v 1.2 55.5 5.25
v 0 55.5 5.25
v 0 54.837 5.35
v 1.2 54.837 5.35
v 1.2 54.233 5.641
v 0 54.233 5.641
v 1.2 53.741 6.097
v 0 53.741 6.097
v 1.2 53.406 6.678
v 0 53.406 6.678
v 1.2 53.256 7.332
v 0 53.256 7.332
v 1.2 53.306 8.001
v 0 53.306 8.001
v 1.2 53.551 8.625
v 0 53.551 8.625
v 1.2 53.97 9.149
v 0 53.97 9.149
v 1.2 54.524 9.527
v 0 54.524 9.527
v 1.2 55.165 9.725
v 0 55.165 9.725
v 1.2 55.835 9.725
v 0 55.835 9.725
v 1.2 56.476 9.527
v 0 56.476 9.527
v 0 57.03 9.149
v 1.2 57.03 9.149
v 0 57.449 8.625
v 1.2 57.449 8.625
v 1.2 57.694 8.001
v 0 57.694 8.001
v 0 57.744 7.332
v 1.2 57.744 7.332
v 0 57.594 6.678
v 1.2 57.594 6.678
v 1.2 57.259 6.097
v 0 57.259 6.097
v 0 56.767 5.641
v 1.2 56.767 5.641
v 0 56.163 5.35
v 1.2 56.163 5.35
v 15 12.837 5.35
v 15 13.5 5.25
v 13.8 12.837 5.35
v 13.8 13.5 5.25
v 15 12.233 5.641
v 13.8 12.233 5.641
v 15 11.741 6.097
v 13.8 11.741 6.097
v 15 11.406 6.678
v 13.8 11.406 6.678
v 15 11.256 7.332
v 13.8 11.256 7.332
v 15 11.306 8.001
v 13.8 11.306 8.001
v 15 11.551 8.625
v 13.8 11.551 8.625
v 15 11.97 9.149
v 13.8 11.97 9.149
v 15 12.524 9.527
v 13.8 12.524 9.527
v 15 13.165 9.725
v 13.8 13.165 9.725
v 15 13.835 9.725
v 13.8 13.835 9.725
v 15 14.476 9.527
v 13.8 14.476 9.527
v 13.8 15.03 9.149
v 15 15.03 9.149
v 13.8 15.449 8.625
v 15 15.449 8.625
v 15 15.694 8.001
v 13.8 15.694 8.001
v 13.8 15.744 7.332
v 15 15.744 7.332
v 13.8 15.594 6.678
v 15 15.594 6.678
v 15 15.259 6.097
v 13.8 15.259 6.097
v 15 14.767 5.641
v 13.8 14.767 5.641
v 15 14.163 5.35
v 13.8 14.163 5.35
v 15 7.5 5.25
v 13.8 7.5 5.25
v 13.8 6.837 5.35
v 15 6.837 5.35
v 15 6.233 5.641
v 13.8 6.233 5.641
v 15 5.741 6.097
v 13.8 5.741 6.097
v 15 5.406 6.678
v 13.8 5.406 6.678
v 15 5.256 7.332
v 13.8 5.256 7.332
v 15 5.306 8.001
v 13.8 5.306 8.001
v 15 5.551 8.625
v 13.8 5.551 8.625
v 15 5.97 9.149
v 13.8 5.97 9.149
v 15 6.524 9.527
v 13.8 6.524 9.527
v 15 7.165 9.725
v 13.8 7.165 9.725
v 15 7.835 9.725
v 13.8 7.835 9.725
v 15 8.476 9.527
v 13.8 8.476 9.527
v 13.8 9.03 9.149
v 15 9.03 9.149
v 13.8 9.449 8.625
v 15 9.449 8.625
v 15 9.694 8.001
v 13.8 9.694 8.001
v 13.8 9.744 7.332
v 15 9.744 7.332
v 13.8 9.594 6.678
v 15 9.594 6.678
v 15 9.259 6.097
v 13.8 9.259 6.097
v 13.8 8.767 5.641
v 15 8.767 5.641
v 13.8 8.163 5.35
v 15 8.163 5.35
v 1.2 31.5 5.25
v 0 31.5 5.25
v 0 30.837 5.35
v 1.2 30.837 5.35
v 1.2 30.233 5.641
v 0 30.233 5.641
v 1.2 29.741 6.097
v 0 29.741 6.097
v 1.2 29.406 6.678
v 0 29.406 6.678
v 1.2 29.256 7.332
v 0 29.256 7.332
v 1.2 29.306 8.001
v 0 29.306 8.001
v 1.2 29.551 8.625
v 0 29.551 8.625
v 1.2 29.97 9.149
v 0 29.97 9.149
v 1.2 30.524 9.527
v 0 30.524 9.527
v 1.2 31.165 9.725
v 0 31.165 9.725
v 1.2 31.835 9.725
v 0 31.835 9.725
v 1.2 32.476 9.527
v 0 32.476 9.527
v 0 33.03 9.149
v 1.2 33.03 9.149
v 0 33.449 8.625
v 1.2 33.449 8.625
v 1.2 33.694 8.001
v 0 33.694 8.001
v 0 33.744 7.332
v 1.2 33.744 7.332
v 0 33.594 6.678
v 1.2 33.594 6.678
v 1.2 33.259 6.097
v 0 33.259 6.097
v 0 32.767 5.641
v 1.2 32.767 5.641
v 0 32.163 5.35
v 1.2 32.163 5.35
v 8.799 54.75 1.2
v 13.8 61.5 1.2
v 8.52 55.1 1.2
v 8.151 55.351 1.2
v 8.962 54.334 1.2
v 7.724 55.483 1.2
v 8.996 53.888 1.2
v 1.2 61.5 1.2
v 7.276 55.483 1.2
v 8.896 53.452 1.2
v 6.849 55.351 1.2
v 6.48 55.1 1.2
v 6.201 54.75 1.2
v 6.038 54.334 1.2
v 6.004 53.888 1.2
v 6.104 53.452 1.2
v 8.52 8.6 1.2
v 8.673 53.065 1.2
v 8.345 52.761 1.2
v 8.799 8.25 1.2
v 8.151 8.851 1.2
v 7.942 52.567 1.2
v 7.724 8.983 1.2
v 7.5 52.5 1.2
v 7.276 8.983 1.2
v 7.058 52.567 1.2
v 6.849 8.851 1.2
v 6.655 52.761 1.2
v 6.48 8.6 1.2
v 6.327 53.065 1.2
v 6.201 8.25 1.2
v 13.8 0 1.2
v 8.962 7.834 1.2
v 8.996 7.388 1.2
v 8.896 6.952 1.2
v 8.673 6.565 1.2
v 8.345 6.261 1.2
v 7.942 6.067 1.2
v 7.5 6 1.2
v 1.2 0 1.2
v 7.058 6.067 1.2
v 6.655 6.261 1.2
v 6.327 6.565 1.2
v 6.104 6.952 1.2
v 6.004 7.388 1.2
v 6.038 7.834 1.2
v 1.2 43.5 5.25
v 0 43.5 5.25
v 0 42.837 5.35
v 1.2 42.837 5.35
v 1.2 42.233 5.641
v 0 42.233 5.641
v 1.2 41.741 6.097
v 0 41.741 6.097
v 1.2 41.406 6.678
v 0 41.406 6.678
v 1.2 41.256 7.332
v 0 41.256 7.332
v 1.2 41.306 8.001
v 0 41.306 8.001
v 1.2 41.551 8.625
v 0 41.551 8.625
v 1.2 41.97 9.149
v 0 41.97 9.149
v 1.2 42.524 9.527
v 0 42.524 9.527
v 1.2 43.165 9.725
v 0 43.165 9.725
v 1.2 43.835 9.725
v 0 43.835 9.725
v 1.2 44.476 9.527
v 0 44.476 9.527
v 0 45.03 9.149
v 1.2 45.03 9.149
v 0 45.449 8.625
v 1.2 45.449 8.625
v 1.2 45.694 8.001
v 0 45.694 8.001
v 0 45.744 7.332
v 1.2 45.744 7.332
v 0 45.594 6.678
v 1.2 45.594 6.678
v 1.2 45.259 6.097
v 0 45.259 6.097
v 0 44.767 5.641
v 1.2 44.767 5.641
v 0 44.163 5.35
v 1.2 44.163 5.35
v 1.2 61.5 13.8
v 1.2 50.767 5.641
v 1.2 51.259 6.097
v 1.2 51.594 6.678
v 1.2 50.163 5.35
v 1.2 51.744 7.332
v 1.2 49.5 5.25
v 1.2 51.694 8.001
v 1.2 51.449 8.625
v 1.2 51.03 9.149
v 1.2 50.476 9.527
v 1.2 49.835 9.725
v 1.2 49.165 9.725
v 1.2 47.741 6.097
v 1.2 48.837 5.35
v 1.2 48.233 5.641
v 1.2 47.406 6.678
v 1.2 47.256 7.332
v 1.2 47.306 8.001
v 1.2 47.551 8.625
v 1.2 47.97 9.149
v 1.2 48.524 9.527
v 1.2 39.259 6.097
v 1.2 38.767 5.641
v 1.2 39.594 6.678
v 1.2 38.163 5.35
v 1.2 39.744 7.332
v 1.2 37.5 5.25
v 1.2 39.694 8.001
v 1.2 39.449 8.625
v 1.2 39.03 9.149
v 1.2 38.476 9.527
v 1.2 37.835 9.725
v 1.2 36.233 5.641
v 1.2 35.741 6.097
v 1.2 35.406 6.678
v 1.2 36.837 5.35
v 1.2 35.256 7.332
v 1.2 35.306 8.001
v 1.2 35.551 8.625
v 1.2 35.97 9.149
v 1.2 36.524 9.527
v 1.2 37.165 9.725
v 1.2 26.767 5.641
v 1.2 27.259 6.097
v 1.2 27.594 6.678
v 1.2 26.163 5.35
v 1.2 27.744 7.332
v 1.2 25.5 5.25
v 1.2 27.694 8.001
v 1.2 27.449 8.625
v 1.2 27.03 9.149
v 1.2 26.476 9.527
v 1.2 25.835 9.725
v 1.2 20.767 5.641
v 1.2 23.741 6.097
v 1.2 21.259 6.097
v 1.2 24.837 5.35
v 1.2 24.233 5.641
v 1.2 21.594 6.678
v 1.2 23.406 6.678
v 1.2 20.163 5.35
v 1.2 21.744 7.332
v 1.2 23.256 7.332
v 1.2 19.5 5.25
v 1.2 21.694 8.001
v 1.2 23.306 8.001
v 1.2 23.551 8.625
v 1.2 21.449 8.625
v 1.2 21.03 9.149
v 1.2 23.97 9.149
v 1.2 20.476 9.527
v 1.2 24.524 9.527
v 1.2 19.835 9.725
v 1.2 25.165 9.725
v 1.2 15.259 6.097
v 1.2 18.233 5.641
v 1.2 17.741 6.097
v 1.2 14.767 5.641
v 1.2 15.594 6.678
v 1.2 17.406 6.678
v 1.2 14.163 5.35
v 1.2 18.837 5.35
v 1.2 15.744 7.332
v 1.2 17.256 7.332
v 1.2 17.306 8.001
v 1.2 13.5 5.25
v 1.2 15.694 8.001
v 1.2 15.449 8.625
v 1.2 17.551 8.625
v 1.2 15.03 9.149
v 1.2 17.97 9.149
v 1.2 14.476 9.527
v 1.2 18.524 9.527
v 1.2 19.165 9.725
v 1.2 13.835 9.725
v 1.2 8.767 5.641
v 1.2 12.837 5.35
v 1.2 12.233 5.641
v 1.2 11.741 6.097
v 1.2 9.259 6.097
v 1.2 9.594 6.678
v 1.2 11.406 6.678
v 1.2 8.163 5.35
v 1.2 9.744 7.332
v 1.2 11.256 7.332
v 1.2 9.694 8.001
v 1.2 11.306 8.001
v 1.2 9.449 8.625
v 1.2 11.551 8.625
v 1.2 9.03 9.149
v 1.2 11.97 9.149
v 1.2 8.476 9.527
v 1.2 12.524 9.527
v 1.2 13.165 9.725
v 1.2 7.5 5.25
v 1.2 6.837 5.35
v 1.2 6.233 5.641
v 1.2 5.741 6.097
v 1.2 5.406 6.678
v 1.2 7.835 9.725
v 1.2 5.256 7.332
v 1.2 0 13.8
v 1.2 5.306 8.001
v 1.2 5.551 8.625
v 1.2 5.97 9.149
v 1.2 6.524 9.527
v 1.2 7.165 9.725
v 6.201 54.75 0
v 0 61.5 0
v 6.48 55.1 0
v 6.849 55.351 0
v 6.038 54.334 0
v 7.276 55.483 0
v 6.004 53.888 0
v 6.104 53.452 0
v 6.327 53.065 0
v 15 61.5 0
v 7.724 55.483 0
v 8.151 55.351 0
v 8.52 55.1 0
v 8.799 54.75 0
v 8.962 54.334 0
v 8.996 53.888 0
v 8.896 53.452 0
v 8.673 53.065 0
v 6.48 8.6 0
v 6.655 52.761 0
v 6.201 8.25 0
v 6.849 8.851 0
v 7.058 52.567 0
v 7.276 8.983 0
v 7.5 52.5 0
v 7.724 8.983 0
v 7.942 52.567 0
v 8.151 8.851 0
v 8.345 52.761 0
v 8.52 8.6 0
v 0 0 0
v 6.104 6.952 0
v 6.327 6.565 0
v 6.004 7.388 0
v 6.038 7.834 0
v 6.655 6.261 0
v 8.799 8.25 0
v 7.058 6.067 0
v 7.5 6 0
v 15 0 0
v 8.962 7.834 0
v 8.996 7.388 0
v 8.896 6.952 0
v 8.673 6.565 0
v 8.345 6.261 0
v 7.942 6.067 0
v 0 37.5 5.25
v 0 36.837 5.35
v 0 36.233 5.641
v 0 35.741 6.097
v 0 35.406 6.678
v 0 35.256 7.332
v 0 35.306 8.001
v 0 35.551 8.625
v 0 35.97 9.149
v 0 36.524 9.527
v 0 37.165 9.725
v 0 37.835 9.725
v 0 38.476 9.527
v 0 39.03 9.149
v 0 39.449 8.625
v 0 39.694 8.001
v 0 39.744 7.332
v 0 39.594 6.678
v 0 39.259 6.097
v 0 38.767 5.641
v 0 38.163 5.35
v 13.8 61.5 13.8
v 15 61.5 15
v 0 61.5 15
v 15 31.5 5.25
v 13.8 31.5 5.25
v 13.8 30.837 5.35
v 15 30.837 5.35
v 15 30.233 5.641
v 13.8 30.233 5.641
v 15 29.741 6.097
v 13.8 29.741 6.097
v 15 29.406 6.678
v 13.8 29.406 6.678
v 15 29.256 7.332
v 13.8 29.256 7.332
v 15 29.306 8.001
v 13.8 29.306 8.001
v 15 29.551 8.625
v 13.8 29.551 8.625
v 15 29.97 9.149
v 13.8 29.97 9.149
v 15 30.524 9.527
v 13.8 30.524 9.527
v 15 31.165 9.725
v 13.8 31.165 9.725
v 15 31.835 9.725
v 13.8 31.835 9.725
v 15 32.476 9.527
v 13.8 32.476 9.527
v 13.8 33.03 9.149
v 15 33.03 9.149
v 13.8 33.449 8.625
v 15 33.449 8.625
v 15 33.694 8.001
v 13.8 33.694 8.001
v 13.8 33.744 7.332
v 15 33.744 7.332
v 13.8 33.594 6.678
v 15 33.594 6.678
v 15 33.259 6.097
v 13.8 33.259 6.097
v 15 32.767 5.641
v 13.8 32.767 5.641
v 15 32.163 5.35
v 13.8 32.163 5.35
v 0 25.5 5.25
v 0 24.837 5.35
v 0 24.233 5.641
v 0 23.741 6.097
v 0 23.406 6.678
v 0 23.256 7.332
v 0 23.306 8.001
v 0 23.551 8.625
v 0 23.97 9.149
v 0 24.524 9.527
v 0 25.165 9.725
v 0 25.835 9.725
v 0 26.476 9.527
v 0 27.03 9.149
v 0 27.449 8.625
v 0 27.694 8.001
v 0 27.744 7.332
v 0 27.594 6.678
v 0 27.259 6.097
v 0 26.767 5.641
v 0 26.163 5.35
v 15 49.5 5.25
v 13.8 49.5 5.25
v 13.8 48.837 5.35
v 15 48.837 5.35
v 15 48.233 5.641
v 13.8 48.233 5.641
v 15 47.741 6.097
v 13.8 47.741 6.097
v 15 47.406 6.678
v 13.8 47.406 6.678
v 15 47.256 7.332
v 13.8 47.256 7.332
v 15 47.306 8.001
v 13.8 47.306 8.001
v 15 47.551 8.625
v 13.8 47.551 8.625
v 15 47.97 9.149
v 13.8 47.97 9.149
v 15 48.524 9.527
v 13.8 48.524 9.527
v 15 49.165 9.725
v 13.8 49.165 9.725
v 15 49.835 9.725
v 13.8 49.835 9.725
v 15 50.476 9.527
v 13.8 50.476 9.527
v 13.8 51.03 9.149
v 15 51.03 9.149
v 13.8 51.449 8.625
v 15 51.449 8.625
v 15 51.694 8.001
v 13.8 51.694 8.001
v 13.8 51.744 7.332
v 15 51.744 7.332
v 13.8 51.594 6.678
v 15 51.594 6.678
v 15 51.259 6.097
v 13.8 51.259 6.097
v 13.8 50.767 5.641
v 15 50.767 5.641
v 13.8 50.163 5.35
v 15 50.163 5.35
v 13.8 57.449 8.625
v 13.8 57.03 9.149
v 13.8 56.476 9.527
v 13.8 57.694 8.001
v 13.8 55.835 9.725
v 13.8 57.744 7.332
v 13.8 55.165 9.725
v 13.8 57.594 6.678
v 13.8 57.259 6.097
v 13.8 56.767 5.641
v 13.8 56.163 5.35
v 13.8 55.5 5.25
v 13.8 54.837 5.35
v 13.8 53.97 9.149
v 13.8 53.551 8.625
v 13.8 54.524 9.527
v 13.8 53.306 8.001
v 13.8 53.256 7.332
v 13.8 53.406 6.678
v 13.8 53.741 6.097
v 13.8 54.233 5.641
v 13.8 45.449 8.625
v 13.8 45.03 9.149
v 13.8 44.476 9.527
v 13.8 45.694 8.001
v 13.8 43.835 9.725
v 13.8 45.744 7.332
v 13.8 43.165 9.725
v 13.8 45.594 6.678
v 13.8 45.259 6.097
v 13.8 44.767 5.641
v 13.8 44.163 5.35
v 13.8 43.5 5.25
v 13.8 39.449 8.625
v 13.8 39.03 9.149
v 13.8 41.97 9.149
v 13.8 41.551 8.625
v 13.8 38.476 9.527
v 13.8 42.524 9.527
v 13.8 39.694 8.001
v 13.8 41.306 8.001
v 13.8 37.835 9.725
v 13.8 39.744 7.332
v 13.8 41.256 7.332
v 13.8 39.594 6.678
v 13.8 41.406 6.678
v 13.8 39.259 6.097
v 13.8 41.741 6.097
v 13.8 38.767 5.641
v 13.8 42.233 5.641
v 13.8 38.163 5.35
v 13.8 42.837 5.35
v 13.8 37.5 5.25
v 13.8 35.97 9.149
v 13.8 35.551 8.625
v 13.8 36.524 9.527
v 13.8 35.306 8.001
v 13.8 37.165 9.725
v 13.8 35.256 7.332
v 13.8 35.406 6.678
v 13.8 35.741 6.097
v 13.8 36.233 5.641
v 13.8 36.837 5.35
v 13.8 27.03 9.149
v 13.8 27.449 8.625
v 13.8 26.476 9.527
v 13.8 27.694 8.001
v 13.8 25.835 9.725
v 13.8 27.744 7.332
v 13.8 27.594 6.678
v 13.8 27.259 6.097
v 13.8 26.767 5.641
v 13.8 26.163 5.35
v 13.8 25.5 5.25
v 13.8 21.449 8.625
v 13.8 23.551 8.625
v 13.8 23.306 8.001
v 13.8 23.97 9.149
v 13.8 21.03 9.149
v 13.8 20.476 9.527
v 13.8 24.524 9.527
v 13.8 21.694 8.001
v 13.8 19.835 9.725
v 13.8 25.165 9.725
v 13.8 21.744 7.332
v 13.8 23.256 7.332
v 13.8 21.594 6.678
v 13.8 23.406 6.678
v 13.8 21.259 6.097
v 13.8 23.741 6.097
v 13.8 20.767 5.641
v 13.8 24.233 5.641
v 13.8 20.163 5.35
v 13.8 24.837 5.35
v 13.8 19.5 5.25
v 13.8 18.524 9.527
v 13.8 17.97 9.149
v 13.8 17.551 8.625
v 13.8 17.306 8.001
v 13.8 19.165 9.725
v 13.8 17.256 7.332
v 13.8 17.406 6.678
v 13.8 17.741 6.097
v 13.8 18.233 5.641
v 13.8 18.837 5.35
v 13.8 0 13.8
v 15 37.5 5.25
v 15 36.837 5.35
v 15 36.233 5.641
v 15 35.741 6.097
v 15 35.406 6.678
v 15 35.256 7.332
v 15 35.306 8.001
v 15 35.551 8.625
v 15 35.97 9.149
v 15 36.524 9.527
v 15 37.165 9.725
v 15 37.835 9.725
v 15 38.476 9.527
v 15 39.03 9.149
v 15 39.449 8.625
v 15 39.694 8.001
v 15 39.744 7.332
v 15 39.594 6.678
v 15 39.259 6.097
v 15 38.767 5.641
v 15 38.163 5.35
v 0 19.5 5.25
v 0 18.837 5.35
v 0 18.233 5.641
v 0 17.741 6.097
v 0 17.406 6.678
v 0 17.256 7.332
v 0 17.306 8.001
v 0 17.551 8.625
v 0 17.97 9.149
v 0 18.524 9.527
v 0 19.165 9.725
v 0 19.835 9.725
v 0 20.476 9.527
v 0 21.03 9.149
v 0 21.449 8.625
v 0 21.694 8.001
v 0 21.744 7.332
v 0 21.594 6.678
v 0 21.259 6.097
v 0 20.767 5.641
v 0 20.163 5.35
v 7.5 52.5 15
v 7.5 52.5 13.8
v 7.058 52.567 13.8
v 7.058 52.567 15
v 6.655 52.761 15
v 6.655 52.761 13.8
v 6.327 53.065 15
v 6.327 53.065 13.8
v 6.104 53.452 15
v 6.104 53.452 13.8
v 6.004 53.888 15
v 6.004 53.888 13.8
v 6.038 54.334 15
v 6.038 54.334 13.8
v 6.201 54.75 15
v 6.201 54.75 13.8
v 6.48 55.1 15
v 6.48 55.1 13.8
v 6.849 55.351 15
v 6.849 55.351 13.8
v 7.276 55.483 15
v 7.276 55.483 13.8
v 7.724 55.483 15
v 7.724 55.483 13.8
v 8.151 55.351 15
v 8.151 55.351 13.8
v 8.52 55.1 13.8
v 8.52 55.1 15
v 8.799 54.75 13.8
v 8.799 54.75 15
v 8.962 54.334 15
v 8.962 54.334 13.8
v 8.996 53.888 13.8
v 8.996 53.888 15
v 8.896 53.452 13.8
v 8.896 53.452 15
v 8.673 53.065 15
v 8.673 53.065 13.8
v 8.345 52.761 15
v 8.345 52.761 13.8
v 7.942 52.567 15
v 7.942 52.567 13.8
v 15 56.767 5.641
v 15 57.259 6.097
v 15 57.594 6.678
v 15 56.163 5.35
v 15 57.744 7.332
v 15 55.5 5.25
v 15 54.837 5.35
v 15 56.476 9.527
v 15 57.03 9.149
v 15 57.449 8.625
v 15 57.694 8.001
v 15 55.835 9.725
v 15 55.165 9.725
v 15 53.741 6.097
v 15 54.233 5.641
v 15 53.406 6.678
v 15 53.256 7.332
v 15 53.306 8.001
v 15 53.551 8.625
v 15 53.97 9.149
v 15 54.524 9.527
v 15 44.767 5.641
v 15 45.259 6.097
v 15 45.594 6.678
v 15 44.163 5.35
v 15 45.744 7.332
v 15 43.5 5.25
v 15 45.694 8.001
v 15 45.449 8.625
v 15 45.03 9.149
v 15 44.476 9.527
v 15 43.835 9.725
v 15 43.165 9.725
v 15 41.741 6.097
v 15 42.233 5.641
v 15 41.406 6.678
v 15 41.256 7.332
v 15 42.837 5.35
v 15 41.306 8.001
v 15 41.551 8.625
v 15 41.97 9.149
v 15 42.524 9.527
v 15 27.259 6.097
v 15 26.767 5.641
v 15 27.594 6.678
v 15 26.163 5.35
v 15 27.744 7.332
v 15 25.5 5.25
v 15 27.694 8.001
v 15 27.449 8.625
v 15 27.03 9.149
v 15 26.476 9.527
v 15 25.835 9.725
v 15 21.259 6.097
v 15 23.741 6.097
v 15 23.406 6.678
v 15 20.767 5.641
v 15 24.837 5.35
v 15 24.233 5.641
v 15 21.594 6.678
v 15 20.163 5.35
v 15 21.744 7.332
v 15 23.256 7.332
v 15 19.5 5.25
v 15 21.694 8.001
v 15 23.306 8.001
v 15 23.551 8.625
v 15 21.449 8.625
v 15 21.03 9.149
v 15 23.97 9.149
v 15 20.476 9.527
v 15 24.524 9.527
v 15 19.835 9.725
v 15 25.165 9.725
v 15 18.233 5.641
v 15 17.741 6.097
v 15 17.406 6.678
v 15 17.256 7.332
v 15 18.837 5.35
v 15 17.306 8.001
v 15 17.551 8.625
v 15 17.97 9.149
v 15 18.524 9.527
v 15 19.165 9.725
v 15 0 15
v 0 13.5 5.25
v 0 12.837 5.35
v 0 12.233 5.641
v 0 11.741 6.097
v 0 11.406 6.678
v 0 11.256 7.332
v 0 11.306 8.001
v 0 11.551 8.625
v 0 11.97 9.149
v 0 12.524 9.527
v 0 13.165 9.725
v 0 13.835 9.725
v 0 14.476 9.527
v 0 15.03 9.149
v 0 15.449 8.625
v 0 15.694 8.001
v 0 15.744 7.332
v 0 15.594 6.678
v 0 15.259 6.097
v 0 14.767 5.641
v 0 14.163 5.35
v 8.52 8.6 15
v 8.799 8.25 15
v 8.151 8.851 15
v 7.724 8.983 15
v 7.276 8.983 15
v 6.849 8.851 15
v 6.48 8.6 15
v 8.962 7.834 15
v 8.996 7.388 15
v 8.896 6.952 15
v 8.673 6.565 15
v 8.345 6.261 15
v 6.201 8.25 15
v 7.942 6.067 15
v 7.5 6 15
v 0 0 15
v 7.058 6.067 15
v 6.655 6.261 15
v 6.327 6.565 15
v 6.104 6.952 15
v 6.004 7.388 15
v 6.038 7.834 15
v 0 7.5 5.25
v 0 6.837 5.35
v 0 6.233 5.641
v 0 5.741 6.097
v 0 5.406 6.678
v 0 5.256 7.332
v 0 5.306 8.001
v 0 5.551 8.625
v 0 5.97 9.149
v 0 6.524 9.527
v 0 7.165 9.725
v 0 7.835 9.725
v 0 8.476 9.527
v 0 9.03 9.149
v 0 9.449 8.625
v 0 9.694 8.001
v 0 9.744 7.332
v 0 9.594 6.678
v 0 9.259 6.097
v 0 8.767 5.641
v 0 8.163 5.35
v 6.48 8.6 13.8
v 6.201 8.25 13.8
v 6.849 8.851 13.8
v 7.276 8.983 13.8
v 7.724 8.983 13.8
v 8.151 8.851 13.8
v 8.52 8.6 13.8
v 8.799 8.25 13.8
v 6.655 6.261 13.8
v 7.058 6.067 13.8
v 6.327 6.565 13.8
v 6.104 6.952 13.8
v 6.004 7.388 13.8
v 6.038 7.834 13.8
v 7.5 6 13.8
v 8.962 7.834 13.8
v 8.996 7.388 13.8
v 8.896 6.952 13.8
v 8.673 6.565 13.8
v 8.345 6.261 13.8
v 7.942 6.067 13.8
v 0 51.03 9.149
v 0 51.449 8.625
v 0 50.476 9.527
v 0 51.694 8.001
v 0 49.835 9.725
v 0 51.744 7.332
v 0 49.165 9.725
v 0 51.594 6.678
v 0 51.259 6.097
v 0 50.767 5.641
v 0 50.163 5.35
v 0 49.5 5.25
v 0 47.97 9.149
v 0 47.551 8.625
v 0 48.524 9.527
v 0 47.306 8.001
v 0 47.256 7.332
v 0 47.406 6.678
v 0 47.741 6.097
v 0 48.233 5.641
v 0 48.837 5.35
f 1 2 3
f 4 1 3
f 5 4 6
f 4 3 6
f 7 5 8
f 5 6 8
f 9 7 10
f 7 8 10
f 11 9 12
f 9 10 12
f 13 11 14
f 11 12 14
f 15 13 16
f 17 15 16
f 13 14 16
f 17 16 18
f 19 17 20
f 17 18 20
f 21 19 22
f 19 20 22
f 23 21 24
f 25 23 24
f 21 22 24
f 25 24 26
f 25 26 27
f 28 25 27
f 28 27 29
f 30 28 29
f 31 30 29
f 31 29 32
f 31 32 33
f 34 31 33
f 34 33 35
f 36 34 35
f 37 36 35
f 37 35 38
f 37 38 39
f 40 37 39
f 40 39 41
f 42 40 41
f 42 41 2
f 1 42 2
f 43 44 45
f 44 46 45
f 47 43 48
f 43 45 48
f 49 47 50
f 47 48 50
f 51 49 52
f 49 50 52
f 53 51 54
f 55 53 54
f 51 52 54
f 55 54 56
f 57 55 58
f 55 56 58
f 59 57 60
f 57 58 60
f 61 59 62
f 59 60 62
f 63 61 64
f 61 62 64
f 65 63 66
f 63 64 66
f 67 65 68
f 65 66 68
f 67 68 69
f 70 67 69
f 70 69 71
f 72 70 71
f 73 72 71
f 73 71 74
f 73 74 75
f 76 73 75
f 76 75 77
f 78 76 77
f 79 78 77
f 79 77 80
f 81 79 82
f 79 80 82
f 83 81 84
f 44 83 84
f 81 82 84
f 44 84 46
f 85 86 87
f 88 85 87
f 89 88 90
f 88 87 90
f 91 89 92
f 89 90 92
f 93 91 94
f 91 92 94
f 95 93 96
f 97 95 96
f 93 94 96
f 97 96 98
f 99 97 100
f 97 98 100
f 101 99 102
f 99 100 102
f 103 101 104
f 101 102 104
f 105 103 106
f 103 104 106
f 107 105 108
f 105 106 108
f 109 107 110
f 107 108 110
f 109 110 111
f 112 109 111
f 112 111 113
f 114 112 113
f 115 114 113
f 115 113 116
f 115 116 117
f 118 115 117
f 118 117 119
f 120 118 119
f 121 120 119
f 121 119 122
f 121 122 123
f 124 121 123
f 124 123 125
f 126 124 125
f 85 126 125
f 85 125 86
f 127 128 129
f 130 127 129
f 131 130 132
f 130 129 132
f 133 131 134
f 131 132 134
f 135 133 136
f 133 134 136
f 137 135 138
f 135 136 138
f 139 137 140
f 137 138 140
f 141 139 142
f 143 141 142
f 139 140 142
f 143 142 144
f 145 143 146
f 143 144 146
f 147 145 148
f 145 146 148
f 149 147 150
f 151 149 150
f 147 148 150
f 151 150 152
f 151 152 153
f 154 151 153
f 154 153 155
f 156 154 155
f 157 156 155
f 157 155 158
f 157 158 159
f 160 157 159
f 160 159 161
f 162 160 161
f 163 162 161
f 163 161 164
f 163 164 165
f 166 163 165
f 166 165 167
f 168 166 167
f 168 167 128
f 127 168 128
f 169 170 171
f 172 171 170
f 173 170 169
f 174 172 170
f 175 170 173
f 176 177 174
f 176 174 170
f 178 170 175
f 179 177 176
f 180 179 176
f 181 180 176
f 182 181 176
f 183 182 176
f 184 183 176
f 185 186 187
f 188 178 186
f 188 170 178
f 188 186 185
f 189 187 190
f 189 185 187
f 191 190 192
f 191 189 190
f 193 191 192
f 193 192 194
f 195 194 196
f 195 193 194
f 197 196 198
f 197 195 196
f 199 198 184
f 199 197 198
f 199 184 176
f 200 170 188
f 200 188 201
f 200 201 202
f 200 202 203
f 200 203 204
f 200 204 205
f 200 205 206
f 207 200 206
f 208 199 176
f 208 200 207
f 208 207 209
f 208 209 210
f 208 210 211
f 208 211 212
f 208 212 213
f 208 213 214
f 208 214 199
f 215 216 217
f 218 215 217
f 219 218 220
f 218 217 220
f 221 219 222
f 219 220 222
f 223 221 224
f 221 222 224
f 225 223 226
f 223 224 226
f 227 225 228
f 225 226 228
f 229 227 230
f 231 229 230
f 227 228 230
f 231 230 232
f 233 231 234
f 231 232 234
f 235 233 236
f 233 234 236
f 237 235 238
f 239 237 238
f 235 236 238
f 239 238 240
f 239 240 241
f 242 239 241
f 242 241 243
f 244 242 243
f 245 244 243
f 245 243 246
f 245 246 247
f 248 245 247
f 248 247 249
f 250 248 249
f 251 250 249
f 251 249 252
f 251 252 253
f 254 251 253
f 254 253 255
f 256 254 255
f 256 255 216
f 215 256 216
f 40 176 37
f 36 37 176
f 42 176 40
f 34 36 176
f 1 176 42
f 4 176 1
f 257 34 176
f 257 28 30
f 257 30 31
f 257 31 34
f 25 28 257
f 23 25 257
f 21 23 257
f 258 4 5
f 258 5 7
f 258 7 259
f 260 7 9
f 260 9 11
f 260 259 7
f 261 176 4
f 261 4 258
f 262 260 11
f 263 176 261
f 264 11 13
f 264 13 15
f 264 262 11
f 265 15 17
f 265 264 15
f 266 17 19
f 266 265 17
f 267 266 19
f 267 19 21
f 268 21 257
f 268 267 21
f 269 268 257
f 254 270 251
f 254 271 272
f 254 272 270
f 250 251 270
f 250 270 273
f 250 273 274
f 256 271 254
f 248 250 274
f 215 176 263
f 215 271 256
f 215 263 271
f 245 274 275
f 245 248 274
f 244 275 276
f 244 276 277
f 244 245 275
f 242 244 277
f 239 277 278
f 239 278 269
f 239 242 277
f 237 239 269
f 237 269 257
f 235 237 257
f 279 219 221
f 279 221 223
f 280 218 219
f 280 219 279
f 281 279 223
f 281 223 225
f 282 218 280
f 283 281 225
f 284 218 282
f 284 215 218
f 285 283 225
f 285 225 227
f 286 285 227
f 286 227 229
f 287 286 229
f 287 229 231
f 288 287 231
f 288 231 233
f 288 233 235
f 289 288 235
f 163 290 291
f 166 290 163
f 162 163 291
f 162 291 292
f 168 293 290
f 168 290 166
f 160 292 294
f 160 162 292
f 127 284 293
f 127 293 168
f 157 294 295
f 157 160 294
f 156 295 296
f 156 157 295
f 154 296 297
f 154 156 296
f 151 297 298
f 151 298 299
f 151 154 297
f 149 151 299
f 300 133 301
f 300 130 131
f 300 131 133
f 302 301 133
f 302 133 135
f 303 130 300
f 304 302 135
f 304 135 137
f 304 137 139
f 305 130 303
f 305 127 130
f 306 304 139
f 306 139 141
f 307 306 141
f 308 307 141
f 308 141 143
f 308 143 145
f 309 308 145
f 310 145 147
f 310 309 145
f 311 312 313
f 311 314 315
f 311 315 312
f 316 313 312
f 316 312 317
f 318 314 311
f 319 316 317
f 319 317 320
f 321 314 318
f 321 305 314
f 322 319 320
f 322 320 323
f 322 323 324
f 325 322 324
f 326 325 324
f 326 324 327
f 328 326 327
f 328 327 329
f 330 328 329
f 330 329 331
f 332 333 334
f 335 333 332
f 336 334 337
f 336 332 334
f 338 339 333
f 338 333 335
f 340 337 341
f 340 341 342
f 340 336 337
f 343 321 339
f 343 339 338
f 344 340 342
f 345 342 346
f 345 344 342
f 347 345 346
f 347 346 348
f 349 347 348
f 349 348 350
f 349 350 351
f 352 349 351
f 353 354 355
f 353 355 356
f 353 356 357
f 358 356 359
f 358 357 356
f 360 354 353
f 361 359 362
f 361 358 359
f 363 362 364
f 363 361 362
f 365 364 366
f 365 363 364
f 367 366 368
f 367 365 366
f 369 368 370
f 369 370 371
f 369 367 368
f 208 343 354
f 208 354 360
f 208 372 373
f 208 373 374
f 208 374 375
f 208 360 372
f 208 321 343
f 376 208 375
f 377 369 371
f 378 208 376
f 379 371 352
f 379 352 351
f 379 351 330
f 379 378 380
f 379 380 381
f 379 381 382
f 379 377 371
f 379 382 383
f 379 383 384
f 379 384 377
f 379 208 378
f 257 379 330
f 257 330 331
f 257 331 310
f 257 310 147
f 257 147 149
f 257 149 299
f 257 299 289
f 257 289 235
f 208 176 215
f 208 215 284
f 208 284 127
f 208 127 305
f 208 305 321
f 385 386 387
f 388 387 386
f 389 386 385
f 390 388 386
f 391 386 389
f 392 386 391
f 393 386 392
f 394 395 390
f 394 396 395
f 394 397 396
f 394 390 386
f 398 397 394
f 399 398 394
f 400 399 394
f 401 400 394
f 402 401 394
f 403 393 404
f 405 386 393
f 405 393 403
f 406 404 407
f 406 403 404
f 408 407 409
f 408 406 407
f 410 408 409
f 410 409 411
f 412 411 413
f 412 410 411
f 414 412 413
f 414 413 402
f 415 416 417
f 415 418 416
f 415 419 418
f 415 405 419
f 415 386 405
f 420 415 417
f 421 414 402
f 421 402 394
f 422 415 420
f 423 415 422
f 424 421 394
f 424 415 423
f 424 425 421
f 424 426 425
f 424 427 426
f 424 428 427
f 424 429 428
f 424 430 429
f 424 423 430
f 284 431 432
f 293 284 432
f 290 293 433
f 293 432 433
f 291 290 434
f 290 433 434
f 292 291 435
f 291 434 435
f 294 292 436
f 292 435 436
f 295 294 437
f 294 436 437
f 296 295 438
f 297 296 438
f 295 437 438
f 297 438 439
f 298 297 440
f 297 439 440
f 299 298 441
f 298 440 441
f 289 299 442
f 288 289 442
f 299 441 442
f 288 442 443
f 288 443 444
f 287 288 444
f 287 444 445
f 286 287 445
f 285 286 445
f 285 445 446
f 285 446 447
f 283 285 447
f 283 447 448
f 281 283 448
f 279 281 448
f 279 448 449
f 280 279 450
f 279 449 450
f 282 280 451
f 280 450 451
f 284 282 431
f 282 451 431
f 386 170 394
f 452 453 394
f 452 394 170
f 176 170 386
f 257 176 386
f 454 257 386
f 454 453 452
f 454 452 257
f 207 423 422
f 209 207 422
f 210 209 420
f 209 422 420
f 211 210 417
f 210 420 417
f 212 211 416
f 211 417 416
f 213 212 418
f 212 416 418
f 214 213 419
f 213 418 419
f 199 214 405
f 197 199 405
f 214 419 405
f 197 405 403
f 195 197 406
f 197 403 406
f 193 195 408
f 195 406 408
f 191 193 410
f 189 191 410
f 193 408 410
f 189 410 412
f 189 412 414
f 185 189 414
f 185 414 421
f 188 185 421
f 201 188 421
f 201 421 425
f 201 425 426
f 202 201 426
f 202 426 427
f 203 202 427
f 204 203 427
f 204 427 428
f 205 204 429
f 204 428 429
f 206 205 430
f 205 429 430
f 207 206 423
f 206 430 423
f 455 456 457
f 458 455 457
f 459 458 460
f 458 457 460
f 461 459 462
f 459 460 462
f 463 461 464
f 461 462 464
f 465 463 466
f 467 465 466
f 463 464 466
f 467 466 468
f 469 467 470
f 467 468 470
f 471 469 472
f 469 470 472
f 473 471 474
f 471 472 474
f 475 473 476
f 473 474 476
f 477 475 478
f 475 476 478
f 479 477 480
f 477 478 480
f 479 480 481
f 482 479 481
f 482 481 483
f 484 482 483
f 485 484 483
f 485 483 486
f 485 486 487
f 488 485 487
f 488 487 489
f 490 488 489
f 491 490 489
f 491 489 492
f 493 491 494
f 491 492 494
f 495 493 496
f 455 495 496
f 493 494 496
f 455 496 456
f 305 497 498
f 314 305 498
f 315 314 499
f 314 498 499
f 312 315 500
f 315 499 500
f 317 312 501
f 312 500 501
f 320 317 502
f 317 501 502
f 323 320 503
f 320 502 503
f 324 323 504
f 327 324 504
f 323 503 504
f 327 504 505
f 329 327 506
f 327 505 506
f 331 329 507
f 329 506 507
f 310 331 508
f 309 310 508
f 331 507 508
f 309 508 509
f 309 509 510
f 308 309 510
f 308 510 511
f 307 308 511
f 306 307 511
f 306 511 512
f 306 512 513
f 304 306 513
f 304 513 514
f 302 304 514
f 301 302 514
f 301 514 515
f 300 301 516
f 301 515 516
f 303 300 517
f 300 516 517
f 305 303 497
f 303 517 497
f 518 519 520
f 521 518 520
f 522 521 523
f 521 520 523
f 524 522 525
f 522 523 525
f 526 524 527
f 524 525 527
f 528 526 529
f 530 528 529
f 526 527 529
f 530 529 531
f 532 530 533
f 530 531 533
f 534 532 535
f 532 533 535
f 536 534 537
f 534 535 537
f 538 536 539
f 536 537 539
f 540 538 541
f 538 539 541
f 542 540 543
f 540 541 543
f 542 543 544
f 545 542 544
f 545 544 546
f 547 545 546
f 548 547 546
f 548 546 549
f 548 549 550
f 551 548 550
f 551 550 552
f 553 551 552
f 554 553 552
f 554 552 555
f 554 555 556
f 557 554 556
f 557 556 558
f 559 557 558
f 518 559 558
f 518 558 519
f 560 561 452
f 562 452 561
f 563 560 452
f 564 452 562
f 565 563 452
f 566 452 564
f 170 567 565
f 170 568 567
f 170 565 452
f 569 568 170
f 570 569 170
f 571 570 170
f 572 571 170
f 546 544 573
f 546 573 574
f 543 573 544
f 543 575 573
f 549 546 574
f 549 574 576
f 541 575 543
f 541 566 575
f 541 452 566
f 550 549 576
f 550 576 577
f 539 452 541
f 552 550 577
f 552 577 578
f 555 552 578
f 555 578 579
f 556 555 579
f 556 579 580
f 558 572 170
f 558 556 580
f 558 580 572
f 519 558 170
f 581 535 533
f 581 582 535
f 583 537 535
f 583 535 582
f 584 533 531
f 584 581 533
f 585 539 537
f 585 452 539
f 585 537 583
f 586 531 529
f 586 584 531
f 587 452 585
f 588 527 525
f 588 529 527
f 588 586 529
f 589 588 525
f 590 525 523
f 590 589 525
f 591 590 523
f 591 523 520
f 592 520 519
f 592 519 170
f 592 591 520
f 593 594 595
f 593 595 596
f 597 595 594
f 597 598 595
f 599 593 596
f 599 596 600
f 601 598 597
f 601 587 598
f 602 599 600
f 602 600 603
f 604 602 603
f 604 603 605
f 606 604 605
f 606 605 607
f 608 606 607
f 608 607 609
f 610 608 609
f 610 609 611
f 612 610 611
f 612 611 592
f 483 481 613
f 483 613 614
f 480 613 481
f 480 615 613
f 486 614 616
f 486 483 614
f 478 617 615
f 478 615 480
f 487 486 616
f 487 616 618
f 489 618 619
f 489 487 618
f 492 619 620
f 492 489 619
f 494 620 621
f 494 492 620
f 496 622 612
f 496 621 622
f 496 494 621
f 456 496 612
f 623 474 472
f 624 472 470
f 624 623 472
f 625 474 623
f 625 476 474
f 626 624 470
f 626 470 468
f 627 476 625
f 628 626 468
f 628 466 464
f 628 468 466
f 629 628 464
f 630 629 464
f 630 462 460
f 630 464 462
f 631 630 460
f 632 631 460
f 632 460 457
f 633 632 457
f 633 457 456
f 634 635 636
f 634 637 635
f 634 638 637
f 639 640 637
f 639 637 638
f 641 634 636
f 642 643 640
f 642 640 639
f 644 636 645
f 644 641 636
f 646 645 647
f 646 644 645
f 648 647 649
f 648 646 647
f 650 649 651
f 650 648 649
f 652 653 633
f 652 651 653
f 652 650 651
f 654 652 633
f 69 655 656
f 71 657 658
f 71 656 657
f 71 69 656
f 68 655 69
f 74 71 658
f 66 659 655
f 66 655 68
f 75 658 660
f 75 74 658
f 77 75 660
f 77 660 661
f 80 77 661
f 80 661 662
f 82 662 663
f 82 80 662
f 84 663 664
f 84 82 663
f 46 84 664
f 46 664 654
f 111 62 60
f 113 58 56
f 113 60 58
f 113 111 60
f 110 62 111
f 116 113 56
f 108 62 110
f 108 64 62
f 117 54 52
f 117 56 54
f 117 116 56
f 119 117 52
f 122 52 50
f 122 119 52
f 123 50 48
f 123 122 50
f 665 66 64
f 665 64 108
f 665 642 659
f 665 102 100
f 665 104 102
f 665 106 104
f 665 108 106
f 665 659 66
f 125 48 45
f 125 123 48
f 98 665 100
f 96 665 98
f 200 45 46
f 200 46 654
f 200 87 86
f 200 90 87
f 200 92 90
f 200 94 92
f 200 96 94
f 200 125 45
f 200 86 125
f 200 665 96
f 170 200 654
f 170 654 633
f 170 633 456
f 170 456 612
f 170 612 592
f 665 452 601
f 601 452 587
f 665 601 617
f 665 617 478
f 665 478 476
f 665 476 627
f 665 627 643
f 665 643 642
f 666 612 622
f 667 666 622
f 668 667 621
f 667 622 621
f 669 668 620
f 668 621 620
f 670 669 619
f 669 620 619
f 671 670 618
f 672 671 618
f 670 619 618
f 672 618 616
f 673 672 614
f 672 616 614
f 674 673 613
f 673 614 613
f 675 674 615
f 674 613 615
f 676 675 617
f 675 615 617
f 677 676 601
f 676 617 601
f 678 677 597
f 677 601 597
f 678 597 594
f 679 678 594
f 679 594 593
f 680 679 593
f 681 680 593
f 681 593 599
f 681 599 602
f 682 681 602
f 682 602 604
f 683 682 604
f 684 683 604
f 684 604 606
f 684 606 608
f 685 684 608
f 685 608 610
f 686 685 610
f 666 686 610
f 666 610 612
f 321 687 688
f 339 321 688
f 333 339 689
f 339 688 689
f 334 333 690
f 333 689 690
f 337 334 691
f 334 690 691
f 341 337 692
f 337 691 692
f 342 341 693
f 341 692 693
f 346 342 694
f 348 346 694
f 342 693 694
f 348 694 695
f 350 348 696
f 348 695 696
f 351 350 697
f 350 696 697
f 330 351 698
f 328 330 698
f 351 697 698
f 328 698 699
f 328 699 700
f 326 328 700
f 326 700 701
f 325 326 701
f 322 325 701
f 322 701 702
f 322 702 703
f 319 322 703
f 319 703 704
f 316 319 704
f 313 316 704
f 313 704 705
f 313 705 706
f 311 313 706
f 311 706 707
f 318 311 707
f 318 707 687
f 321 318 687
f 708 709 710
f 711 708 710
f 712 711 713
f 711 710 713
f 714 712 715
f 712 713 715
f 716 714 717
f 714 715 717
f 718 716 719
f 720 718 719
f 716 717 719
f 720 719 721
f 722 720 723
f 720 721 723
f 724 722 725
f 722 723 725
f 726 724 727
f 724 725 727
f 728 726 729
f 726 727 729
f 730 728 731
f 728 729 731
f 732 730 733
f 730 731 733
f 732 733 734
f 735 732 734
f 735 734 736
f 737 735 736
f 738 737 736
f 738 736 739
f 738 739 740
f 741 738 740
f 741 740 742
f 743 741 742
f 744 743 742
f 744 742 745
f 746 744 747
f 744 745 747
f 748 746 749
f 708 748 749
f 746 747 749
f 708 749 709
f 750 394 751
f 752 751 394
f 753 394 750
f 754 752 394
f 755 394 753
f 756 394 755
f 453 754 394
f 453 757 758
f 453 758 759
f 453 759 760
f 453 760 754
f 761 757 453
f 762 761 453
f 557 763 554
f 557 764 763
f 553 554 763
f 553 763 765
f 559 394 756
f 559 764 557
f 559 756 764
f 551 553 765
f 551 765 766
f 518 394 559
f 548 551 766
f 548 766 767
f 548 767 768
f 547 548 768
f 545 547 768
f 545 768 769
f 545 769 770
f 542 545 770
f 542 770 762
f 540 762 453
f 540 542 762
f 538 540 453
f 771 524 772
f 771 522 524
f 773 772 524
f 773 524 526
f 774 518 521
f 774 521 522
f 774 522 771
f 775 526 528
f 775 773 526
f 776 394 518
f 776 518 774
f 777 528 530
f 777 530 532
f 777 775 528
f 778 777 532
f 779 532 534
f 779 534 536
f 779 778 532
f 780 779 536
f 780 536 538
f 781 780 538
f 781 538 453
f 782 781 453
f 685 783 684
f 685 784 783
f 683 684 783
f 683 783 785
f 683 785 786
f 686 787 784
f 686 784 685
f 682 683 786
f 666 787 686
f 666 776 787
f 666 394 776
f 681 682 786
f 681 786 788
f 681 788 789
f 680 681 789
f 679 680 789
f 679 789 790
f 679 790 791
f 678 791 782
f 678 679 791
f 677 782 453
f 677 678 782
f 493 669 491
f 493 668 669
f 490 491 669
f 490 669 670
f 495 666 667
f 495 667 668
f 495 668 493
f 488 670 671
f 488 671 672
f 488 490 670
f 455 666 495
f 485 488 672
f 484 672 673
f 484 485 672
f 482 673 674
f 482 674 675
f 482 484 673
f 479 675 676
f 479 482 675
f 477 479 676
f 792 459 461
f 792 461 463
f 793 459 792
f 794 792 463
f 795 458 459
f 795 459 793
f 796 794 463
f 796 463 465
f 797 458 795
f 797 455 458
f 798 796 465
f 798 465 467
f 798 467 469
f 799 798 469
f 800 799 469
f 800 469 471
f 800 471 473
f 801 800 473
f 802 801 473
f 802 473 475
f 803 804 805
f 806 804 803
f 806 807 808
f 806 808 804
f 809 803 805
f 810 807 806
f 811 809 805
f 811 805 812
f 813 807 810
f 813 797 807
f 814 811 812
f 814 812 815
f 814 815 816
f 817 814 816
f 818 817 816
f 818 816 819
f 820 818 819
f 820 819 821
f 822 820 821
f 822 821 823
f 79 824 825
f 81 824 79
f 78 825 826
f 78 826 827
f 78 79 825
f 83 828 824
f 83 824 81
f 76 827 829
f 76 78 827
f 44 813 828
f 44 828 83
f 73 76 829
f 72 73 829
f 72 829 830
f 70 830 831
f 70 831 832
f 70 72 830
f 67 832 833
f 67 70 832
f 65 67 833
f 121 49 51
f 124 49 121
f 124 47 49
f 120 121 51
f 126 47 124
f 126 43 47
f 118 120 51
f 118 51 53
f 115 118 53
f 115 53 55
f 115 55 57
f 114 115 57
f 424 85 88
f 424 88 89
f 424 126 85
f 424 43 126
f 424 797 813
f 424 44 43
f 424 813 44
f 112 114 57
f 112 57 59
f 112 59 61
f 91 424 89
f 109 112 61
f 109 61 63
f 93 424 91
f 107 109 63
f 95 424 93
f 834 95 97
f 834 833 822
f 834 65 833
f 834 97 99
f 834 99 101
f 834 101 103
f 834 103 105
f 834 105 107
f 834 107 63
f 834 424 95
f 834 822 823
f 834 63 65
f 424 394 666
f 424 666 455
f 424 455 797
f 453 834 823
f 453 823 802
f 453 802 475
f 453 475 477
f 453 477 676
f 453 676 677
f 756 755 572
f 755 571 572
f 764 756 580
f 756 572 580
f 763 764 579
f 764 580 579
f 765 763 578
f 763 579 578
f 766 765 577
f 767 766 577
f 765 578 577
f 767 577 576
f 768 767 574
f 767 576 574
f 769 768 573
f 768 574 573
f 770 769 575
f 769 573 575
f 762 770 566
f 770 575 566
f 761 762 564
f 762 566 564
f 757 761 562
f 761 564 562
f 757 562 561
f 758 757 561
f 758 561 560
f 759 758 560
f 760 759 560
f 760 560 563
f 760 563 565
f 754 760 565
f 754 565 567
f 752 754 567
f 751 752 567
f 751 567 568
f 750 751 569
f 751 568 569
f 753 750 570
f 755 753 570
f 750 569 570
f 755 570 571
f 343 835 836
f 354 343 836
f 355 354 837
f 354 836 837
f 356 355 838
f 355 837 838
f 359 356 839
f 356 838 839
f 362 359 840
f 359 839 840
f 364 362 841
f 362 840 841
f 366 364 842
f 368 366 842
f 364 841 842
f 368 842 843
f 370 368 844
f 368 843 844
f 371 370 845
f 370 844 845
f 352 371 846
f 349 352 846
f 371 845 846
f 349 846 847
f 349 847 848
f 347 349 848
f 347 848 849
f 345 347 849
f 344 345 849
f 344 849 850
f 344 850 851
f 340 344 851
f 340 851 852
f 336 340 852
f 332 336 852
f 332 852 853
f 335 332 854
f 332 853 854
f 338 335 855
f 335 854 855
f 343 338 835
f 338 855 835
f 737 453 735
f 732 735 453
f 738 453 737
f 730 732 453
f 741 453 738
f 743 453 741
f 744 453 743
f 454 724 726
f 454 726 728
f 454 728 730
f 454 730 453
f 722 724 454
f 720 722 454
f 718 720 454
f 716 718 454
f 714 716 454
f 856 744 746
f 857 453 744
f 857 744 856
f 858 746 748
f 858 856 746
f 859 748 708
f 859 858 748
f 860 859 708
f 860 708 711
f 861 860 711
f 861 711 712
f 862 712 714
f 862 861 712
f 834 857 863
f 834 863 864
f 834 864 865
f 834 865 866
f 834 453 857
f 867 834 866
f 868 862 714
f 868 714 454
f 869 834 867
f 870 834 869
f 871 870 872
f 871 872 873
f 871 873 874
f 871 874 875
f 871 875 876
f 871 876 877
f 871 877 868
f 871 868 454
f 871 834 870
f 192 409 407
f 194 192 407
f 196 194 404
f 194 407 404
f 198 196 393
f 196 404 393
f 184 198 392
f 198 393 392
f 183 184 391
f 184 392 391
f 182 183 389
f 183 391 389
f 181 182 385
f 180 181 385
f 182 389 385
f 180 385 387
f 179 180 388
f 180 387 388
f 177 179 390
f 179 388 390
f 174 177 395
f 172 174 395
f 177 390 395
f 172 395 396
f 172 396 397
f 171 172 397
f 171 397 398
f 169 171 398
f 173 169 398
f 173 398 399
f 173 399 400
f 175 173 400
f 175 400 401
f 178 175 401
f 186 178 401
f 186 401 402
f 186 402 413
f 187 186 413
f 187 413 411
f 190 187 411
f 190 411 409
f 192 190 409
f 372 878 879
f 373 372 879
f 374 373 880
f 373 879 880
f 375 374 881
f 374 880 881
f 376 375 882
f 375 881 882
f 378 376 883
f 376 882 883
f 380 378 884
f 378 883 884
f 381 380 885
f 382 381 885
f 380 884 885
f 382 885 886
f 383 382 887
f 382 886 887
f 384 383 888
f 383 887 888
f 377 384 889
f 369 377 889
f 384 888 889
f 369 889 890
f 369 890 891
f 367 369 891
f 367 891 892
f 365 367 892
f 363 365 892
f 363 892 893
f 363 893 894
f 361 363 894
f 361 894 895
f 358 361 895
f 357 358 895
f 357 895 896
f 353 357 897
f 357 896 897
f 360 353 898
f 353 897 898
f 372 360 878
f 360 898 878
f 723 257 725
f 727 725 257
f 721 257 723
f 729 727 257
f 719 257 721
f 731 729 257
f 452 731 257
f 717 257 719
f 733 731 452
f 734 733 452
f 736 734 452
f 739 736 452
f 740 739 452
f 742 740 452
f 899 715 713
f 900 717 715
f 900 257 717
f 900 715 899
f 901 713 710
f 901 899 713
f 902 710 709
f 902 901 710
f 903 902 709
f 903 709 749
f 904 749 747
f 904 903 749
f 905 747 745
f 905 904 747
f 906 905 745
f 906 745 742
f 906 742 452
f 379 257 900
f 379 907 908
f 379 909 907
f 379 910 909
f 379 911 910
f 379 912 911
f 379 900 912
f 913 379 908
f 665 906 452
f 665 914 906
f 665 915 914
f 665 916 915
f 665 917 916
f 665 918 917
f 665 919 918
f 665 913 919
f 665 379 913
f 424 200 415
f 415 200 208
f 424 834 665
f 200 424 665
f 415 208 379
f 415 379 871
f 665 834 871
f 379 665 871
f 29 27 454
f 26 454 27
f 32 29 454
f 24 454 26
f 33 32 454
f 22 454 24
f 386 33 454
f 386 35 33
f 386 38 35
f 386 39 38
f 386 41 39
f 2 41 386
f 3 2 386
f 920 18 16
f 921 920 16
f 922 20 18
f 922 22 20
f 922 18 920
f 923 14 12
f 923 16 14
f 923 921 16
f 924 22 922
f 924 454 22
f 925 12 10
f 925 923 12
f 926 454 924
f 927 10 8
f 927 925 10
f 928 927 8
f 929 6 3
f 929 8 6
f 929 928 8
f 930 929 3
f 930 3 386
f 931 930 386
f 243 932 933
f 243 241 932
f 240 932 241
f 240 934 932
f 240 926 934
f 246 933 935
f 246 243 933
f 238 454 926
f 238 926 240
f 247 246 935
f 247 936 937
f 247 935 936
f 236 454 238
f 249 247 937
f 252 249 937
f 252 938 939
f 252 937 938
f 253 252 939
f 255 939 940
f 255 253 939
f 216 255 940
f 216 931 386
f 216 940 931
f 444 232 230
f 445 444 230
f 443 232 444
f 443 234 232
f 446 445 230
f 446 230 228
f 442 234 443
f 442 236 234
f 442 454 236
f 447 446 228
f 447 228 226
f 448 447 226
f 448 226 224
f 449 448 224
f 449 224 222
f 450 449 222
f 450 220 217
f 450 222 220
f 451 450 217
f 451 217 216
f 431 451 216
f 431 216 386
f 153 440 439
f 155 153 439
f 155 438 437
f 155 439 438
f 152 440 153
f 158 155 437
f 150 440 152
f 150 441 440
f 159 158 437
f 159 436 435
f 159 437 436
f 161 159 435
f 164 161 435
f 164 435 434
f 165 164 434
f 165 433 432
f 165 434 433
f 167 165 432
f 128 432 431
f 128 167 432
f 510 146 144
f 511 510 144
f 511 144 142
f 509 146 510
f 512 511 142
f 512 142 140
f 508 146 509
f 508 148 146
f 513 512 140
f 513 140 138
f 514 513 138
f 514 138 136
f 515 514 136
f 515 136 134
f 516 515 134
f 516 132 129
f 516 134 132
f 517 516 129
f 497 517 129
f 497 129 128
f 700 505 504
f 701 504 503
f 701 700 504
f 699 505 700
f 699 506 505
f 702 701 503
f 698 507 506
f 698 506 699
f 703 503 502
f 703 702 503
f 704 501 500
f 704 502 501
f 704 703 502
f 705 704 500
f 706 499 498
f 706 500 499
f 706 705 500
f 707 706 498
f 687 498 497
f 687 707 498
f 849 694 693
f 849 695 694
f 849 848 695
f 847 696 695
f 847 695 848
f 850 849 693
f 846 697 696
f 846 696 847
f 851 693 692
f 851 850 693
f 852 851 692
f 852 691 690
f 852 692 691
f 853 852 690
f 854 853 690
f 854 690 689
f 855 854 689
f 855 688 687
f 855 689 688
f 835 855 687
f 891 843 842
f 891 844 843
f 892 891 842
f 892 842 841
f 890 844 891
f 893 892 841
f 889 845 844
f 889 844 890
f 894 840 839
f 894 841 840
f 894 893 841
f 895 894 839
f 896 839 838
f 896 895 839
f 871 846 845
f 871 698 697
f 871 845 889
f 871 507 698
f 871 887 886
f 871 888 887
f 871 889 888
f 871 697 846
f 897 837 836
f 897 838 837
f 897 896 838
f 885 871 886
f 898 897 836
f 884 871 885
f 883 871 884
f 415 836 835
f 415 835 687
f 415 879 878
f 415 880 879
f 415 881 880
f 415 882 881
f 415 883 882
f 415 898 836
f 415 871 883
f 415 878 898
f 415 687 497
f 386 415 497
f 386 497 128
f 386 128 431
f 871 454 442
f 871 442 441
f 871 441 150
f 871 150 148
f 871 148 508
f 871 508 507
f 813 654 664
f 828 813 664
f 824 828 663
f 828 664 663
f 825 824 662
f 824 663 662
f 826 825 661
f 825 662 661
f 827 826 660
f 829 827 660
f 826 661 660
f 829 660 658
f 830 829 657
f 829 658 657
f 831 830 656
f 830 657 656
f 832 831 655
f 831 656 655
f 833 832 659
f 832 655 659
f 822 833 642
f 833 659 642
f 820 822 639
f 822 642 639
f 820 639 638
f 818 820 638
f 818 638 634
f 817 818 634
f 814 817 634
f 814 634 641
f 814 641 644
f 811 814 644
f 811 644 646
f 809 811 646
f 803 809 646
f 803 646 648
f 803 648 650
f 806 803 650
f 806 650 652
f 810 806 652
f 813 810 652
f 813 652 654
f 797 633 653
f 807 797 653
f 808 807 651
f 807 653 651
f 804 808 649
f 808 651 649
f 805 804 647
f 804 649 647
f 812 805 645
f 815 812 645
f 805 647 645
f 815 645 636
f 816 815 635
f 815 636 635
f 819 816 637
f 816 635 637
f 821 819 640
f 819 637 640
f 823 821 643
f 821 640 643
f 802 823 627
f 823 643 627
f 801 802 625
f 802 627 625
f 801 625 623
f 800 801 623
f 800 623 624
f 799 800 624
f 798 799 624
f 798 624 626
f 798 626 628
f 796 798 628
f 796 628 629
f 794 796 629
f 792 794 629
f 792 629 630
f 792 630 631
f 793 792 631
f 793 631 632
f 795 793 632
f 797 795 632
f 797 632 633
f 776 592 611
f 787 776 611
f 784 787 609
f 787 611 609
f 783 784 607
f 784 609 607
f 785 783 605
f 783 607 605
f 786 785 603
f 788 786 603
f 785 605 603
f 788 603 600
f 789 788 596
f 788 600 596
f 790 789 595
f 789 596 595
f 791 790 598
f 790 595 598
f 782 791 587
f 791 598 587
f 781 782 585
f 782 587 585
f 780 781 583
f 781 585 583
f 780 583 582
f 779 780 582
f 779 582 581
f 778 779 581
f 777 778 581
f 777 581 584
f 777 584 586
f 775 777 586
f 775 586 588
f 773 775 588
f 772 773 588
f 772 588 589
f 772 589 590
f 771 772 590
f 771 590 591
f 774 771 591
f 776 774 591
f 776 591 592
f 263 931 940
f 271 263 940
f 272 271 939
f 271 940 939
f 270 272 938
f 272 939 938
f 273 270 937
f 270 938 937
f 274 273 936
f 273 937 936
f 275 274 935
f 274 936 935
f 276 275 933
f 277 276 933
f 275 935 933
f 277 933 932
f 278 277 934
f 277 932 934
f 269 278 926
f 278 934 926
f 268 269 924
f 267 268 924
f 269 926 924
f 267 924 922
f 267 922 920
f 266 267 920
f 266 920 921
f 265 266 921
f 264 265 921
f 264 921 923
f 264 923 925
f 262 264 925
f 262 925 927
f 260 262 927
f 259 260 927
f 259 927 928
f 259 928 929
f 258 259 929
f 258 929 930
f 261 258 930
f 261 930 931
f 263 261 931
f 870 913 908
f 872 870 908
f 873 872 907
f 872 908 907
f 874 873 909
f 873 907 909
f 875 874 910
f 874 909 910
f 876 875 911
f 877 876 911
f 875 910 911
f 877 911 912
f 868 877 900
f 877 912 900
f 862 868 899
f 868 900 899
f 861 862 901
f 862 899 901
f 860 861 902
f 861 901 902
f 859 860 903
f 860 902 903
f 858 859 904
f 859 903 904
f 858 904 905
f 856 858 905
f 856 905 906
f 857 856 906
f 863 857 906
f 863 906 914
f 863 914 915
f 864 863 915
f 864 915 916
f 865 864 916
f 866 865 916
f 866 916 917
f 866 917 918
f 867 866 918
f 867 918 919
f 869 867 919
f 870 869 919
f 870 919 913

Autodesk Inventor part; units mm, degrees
ref_plane "YZ Plane" through (0, 0, 0) normal (1, 0, 0) x (0, 1, 0)
ref_plane "XZ Plane" through (0, 0, 0) normal (0, 1, 0) x (-1, 0, 0)
ref_plane "XY Plane" through (0, 0, 0) normal (0, 0, 1) x (1, 0, 0)
sketch "スケッチ1" plane through (0, 0, 0) normal (0, 1, 0) x (-1, 0, 0)
  line L0 (0, 0) -> (-15, 0)
  line L1 (-15, 0) -> (-15, 15)
  line L2 (-15, 15) -> (0, 15)
  line L3 (0, 15) -> (0, 0)
  line L4 (-1.2, 13.8) -> (-13.8, 13.8)
  line L5 (-13.8, 13.8) -> (-13.8, 1.2)
  line L6 (-13.8, 1.2) -> (-1.2, 1.2)
  line L7 (-1.2, 1.2) -> (-1.2, 13.8)
  dimension "d0" = 15
  dimension "d1" = 15
  dimension "d2" = 1.2
  dimension "d3" = 1.2
  dimension "d4" = 1.2
  dimension "d5" = 1.2
extrude "押し出し1" add sketch "スケッチ1" along normal blind 61.5
sketch "スケッチ2" plane through (0, 0, 15) normal (0, 0, 1) x (1, 0, 0)
  line L0 (0, 0) -> (0, 61.5) projected
  line L1 (0, 61.5) -> (15, 61.5) projected
  line L2 (0, 0) -> (15, 0) projected
  point P0 (7.5, 54)
  point P1 (7.5, 7.5)
  dimension "d8" = 7.5
  dimension "d9" = 7.5
  dimension "d10" = 7.5
  dimension "d11" = 7.5
hole "穴1" at (7.5, 54, 15) at (7.5, 7.5, 15) direction (0, 0, -1) diameter 3 end through all
sketch "スケッチ3" plane through (15, 0, 15) normal (1, 0, 0) x (0, 0, -1)
  line L0 (0, 61.5) -> (15, 61.5) projected
  line L1 (15, 0) -> (15, 61.5) projected
  point P0 (7.5, 55.5)
  point P1 (7.5, 49.5)
  point P2 (7.5, 43.5)
  point P3 (7.5, 37.5)
  point P4 (7.5, 31.5)
  point P5 (7.5, 25.5)
  point P6 (7.5, 19.5)
  point P7 (7.5, 13.5)
  point P8 (7.5, 7.5)
  dimension "d19" = 6
  dimension "d20" = 7.5
  dimension "d23" = 6
hole "穴2" at (15, 55.5, 7.5) at (15, 49.5, 7.5) at (15, 43.5, 7.5) at (15, 37.5, 7.5) at (15, 31.5, 7.5) at (15, 25.5, 7.5) at (15, 19.5, 7.5) at (15, 13.5, 7.5) at (15, 7.5, 7.5) direction (-1, 0, 0) diameter 4.5 end through all
equation "\"d3\" = d2"
equation "\"d4\" = d3"
equation "\"d5\" = d3"
equation "\"d9\" = d8"
equation "\"d10\" = d8"
equation "\"d11\" = d9"
properties part number "ロボットベース15x15_5" material "アルミニウム 6061"
